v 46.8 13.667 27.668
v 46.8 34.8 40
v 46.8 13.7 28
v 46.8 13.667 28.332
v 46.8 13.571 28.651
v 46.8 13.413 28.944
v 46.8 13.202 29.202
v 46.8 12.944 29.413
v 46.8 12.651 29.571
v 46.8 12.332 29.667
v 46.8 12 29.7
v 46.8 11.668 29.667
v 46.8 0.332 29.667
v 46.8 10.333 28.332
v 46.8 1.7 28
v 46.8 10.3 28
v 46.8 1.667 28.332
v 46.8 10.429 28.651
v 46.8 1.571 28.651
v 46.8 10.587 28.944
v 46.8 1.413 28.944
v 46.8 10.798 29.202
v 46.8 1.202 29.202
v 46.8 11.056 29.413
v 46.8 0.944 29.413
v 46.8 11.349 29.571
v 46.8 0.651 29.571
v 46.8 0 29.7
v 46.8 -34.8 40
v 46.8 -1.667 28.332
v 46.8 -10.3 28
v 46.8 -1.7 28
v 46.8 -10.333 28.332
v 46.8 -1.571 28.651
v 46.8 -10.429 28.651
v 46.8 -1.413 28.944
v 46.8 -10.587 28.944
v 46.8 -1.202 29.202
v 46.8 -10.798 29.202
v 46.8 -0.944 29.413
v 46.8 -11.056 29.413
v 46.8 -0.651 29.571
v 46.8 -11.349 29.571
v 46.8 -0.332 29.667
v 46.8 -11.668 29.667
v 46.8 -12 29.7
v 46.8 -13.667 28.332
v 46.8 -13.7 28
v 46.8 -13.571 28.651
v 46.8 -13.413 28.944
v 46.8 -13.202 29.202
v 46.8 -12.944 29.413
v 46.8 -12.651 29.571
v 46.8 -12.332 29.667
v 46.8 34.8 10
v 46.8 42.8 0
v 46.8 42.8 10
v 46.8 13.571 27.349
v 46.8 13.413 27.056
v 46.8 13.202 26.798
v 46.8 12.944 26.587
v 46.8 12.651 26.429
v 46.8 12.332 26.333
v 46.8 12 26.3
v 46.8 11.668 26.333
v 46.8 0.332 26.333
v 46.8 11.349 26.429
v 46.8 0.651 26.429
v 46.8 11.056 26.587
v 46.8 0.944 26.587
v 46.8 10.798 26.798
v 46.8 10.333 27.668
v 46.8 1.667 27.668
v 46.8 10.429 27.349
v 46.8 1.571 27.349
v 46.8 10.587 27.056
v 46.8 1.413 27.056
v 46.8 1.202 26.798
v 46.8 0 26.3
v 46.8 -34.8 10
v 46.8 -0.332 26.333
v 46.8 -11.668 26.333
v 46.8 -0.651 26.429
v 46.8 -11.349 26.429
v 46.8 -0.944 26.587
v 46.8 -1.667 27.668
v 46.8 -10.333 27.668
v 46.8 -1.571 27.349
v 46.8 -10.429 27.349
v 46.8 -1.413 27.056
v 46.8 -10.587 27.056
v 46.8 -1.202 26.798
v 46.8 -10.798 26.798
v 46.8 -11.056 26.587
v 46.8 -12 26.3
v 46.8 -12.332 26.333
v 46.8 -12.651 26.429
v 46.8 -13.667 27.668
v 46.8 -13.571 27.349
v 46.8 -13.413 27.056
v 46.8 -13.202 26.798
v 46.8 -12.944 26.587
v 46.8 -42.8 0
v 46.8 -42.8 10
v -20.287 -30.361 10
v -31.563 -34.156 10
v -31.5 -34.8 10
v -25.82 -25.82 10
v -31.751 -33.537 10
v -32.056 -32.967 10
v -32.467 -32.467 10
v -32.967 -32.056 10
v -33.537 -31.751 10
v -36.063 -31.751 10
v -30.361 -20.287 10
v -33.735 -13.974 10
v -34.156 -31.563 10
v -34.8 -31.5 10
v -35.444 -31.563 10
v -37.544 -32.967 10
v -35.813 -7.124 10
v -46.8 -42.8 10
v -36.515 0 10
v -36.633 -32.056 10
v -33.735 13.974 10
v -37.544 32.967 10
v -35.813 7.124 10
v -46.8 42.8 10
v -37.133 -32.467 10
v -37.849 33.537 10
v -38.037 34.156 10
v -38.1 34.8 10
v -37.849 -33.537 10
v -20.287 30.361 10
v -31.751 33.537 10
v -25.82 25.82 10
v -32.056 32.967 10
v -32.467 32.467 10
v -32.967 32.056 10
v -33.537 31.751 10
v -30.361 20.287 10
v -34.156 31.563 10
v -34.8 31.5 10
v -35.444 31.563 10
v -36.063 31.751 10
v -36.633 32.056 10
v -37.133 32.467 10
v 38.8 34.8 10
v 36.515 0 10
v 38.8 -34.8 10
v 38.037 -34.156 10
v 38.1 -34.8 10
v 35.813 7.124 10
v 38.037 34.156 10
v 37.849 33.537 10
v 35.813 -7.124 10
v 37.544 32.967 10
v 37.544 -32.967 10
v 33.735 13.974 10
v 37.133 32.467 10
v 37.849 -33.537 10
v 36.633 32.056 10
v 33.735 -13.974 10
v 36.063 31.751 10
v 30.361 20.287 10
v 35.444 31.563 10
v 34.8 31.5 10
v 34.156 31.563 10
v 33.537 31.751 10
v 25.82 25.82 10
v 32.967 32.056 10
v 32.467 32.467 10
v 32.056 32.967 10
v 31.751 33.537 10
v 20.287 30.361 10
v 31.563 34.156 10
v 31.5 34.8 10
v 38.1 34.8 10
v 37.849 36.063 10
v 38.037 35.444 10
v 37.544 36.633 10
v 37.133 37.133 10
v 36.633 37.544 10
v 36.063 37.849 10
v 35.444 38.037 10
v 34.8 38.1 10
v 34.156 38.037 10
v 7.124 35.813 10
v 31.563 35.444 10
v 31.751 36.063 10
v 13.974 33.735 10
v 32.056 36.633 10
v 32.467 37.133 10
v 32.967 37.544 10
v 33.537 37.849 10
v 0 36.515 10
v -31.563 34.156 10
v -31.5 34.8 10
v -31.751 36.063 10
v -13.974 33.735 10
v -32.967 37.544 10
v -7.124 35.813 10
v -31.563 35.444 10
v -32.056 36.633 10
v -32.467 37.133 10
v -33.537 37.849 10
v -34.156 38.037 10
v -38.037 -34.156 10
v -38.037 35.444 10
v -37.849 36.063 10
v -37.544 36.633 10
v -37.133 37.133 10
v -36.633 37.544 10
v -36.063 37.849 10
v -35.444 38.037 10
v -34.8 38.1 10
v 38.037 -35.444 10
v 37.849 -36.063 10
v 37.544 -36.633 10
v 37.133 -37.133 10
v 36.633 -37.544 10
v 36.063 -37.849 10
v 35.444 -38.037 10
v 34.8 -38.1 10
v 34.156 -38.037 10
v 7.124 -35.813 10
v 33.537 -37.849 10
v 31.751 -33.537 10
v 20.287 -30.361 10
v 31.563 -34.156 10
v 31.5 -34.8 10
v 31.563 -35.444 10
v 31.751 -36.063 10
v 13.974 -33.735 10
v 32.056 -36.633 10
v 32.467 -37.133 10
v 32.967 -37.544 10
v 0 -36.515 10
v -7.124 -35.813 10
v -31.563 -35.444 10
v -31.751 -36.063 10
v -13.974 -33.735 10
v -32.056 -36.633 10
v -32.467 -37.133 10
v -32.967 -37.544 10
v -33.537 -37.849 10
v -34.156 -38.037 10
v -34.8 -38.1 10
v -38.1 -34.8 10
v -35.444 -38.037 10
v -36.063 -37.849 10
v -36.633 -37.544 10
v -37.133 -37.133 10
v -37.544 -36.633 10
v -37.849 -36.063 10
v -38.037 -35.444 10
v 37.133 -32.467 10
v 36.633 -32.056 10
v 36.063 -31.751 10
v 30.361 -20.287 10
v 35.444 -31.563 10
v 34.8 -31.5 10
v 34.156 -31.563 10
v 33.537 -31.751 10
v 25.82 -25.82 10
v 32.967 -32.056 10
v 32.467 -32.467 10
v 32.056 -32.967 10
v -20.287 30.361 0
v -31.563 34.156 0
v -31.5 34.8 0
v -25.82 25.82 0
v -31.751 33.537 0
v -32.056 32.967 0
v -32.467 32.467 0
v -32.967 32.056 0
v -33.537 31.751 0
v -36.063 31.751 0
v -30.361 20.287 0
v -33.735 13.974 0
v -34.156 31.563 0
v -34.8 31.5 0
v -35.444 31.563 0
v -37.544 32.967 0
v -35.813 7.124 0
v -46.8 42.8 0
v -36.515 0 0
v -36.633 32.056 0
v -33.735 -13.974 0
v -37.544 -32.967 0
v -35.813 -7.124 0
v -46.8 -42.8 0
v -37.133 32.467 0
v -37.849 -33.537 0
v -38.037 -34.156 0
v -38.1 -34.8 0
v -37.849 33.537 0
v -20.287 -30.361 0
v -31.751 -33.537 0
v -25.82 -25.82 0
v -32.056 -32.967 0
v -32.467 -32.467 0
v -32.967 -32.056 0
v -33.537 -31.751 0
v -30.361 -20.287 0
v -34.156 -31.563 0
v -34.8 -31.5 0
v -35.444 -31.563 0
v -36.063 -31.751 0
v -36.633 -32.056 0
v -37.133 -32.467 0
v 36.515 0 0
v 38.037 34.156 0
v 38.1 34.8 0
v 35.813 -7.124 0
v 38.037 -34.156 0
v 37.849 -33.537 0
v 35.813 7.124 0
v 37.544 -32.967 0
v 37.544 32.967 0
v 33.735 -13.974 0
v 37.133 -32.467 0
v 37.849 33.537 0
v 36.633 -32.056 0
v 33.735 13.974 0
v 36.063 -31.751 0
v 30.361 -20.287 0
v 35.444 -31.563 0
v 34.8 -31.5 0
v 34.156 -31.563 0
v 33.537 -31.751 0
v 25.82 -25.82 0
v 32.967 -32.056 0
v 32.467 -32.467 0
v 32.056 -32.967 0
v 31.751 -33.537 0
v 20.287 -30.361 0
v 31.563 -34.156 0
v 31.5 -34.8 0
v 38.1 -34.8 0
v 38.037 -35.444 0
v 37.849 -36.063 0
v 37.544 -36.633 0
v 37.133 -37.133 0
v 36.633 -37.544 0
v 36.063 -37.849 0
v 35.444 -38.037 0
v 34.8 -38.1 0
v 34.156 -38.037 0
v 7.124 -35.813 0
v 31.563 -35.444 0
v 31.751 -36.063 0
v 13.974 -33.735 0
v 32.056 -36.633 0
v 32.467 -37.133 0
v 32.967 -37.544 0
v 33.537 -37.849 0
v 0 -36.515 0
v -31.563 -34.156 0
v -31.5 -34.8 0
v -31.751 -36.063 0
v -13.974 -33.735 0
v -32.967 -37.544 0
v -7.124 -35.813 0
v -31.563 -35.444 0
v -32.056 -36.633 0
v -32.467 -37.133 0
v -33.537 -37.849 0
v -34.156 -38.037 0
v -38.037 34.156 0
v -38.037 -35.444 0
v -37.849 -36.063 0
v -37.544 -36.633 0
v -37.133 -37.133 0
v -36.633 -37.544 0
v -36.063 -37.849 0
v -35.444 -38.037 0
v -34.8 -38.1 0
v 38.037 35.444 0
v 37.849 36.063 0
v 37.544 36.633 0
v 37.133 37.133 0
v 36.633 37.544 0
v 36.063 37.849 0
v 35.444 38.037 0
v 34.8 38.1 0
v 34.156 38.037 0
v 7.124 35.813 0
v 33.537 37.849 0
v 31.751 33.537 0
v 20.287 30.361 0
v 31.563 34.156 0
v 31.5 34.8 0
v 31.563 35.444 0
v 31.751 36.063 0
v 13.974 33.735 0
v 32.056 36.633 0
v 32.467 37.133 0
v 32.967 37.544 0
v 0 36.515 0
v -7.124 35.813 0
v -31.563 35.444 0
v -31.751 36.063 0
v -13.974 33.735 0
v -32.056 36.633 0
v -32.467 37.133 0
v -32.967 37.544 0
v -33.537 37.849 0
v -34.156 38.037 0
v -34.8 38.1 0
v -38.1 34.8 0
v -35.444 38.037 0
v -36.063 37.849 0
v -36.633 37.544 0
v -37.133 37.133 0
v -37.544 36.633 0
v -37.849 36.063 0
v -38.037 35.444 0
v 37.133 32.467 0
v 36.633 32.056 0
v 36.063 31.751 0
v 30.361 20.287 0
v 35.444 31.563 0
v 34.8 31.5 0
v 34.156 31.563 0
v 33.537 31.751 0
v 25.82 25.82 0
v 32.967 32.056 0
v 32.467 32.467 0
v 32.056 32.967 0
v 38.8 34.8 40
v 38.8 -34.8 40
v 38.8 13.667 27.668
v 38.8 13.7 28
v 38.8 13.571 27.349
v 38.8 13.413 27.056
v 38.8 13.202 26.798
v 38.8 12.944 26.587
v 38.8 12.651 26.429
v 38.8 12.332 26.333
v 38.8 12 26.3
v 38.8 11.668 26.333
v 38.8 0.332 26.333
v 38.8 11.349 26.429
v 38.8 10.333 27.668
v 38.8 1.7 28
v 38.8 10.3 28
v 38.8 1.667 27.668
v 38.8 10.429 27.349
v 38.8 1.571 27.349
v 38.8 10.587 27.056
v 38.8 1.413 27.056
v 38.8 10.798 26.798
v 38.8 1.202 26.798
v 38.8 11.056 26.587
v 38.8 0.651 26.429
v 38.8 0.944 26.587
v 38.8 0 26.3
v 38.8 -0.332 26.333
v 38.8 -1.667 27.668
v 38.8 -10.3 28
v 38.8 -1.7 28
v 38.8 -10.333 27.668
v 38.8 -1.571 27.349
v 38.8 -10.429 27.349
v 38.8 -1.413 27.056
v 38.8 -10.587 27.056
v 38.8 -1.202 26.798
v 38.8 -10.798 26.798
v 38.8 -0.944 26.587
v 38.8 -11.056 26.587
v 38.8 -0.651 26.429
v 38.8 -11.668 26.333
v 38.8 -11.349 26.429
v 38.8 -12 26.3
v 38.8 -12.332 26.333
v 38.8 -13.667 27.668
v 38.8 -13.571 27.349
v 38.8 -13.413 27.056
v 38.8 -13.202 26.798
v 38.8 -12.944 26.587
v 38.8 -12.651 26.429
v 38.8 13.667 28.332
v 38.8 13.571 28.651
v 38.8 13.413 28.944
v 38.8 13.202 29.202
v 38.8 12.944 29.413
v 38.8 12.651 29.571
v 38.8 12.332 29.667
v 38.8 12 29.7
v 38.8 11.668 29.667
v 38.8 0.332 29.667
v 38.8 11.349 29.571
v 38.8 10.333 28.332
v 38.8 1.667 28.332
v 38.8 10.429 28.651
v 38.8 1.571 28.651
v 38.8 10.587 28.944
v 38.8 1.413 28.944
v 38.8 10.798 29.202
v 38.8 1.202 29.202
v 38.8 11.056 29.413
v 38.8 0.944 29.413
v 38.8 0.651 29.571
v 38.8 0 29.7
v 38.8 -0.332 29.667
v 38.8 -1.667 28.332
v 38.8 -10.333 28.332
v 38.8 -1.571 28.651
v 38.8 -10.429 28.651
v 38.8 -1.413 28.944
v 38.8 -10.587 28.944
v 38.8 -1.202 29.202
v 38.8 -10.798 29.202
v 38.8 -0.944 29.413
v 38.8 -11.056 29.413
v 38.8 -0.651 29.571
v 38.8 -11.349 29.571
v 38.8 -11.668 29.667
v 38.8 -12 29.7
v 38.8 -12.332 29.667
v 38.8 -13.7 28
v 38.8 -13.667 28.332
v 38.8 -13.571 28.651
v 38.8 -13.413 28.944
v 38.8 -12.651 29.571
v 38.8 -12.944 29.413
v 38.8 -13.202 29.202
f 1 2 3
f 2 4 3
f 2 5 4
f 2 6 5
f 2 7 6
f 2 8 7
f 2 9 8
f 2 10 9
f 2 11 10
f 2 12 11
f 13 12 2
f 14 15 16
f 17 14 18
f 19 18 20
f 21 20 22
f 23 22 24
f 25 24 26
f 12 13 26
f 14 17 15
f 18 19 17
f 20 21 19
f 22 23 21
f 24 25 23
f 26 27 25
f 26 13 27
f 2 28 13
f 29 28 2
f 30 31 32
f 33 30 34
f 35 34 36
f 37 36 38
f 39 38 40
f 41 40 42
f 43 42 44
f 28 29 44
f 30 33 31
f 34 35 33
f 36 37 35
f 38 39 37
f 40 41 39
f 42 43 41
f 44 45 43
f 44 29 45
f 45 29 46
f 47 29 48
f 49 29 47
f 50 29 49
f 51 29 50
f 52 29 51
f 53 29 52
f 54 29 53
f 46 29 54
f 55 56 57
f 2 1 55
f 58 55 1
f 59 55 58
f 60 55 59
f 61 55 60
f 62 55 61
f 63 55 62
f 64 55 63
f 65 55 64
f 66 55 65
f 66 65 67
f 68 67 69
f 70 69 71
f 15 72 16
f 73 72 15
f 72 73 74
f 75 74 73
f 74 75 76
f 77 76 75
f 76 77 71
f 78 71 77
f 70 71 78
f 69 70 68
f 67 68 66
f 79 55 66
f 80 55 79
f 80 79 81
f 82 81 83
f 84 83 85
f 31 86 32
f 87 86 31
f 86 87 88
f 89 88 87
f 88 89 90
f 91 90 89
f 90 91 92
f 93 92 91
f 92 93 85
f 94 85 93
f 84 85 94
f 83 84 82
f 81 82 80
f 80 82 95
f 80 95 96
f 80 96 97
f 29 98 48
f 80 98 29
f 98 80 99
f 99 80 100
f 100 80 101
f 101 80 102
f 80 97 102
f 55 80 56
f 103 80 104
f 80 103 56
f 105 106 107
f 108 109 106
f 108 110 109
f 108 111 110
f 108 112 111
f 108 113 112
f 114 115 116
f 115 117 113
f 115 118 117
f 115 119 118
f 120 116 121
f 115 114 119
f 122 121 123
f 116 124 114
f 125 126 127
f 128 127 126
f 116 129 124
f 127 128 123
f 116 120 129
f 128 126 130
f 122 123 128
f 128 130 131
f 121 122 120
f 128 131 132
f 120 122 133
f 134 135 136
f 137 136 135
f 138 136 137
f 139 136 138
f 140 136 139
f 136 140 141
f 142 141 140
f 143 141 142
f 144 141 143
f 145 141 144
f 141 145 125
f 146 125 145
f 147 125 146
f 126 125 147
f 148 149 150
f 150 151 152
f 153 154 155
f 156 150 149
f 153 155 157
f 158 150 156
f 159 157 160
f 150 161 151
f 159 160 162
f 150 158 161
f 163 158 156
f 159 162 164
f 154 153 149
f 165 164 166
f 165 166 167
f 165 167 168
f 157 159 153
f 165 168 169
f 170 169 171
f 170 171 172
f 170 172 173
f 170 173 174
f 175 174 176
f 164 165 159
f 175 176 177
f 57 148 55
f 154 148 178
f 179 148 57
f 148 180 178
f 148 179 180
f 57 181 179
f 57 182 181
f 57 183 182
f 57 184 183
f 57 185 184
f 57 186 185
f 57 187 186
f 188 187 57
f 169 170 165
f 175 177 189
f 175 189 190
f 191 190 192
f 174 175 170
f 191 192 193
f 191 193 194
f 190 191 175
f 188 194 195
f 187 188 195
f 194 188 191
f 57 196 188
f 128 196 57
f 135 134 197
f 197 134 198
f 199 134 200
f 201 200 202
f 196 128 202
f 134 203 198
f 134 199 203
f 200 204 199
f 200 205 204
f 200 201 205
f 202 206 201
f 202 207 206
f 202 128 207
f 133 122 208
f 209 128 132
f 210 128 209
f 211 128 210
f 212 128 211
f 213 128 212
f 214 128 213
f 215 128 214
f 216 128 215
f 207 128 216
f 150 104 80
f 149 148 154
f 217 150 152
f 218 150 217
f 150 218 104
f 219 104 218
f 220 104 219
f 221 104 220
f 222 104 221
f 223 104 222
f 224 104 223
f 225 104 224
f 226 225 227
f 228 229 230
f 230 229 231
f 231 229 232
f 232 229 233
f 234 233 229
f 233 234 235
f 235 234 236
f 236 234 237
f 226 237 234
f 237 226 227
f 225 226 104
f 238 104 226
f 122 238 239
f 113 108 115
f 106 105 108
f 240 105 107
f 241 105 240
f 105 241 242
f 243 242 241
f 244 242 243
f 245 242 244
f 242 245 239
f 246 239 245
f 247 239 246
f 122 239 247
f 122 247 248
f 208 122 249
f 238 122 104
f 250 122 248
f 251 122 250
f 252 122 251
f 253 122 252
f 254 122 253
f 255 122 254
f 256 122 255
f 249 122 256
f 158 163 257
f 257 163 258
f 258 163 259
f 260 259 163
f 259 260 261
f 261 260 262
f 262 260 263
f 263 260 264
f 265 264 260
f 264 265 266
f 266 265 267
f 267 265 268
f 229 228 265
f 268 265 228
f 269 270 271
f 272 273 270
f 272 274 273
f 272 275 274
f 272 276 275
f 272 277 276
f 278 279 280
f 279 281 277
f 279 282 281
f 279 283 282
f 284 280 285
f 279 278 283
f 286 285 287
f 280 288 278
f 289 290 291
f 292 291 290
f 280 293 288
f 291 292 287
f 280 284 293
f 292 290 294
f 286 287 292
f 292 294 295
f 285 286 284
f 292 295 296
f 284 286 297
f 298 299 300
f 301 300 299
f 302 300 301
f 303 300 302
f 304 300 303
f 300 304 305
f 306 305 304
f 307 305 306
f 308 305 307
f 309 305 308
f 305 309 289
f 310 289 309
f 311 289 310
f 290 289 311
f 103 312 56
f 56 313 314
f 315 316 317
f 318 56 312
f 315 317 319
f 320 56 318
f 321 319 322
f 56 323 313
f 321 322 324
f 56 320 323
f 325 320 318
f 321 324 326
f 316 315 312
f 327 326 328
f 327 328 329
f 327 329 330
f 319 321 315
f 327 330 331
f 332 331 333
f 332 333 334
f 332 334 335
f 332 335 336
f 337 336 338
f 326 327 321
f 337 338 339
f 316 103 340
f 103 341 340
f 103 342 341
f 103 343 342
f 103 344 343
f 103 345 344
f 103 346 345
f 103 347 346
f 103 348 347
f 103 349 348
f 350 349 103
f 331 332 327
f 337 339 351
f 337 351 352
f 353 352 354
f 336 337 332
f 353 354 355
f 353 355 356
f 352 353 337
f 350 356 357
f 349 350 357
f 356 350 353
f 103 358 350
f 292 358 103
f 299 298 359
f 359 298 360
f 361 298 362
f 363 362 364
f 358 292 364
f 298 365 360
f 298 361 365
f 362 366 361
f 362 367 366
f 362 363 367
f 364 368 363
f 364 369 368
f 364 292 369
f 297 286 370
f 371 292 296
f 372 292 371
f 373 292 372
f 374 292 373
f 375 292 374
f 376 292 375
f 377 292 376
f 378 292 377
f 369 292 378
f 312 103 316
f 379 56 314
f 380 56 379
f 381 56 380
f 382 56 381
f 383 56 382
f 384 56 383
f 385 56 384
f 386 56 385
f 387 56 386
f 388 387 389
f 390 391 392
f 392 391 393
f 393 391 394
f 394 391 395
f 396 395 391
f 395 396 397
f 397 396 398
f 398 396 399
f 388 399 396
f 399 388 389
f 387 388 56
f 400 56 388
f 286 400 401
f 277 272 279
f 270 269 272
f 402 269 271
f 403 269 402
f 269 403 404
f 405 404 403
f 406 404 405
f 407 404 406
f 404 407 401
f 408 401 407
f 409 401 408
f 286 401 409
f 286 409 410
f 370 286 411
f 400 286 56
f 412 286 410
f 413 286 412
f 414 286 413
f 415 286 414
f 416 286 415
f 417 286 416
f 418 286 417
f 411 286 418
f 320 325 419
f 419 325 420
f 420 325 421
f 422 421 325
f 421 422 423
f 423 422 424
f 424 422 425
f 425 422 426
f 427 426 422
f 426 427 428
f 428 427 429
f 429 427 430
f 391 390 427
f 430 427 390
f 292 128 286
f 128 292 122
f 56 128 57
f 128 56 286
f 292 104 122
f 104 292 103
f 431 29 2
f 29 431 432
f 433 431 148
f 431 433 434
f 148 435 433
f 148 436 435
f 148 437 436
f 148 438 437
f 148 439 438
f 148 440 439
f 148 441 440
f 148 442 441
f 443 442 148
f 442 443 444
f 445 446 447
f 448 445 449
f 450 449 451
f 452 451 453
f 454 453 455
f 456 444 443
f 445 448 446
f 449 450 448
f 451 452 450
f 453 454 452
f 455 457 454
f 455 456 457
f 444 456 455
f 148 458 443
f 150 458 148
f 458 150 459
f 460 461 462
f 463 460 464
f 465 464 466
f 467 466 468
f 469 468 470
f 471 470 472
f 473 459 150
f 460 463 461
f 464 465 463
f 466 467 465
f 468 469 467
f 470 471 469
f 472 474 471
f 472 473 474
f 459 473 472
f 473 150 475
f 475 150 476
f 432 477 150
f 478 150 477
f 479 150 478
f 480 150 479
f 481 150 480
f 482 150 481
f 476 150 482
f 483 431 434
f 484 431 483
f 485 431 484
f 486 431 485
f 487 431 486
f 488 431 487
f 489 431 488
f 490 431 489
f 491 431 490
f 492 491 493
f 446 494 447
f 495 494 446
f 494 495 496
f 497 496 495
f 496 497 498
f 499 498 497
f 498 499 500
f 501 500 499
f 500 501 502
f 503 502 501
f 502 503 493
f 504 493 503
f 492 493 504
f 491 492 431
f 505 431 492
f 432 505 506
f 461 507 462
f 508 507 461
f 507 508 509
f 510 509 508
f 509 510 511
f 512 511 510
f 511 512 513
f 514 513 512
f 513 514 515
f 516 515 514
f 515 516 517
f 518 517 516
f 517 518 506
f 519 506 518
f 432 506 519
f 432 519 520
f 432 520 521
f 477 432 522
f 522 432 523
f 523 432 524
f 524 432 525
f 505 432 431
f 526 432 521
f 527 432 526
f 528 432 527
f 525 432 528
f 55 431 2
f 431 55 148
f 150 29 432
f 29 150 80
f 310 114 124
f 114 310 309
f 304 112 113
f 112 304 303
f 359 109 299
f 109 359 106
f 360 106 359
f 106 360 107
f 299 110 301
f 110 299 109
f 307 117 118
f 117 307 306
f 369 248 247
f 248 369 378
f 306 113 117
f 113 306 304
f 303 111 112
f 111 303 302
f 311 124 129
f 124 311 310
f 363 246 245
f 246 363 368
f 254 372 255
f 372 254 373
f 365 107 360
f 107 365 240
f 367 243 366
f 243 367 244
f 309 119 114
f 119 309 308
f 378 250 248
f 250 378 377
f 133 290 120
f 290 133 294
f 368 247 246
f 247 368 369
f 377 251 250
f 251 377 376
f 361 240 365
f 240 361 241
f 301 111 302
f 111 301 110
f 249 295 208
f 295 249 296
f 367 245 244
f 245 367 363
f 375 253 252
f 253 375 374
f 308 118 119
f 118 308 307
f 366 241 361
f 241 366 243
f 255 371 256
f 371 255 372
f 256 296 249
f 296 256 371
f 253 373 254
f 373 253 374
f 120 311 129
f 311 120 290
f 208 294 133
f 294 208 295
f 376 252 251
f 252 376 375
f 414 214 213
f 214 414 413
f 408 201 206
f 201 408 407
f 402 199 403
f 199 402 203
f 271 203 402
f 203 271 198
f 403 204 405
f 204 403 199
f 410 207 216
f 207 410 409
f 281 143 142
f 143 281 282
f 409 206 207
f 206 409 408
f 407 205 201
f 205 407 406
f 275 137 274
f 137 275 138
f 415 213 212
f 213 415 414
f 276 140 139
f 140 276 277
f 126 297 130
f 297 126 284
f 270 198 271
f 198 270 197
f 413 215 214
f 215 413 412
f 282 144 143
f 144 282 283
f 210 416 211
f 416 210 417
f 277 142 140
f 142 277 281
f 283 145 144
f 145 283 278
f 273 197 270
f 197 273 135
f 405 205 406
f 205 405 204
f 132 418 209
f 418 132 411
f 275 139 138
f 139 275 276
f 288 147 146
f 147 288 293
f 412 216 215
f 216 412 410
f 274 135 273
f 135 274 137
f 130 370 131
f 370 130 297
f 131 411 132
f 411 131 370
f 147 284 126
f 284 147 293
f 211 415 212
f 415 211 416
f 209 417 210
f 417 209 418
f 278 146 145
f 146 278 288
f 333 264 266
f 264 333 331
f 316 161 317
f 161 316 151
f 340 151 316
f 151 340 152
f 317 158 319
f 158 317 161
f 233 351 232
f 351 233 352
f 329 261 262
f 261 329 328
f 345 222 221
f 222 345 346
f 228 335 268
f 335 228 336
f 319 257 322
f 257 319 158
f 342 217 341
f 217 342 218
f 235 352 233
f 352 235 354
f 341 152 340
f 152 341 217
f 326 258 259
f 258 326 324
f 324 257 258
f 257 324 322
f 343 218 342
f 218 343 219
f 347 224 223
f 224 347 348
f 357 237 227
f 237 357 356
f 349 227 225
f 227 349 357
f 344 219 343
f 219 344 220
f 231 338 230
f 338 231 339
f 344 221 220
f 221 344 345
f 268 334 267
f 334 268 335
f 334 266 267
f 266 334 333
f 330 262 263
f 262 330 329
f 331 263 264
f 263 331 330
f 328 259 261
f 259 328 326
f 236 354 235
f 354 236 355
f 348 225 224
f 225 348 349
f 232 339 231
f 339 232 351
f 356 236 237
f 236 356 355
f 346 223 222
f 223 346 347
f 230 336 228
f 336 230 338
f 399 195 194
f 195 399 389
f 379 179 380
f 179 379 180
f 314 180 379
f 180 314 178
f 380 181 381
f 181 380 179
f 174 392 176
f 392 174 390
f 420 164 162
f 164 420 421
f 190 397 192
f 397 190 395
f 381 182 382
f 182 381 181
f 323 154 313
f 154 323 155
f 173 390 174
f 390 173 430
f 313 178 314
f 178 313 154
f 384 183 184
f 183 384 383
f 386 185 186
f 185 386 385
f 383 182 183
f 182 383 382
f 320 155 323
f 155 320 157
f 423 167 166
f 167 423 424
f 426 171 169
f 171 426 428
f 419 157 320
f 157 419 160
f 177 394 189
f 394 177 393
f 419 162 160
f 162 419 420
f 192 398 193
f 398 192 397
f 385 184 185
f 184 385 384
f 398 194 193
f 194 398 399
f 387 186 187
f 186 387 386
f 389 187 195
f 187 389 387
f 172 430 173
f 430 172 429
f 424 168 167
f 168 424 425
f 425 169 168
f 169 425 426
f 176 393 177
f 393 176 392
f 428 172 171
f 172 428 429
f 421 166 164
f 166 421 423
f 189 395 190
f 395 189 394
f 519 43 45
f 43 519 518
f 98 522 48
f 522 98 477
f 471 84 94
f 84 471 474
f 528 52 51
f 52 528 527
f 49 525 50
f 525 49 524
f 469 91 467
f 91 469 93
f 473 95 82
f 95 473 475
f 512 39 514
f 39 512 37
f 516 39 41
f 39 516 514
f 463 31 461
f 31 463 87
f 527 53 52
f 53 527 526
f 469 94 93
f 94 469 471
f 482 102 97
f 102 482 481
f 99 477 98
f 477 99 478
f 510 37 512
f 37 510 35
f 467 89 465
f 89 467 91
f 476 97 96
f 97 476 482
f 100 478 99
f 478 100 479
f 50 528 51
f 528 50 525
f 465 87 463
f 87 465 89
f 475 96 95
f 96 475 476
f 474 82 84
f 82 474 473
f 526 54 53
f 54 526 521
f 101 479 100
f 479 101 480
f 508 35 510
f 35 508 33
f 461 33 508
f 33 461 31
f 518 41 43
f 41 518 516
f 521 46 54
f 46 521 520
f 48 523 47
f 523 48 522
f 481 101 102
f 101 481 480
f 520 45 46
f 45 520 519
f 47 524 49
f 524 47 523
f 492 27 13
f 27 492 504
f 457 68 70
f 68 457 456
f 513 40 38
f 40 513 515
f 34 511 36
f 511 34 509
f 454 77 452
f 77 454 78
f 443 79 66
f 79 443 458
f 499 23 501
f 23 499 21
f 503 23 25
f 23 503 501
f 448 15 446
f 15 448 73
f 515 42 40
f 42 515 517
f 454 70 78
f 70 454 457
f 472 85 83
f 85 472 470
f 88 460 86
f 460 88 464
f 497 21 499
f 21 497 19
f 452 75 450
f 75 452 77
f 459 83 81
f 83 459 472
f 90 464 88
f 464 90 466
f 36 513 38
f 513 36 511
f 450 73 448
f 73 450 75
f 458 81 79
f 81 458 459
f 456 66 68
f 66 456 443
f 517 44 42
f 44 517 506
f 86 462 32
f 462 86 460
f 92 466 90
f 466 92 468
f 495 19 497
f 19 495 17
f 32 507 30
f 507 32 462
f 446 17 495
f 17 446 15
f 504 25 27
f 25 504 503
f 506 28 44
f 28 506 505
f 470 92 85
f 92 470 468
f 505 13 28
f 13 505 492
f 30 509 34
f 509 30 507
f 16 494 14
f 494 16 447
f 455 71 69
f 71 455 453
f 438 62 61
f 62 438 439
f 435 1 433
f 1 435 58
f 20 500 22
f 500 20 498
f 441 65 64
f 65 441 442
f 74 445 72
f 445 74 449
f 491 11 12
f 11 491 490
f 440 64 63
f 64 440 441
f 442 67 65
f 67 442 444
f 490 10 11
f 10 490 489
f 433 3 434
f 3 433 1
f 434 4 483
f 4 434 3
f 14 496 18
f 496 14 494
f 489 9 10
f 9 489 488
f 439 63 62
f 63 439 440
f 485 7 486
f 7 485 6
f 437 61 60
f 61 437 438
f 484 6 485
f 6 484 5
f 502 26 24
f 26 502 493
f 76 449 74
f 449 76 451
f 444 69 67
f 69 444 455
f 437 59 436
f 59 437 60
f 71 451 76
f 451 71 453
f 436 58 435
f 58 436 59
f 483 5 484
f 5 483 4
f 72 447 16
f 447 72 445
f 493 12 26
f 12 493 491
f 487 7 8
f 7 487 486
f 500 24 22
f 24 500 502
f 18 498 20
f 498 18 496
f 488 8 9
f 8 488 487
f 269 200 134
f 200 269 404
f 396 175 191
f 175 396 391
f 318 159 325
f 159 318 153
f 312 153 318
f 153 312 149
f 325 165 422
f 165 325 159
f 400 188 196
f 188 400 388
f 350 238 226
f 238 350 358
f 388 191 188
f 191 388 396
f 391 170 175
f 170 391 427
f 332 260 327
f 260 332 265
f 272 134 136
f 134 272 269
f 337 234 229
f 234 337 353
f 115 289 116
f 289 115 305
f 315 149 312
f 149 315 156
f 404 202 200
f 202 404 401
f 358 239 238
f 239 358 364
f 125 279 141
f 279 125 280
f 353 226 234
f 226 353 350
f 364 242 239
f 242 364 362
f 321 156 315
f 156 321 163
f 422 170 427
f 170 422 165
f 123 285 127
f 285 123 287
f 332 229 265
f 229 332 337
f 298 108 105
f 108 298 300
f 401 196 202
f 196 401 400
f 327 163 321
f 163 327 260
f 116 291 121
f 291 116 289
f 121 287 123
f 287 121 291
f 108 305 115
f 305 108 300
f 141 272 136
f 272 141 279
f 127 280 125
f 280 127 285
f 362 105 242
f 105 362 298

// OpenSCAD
$fn = 32;

// ----------------------------------------------------------------------
// Motor mount plate: NEMA34, 93.6 x 85.6 x 50 mm
// ----------------------------------------------------------------------

// --- parameters (mm) ---
plate_w = 93.6;           // plate length, X
plate_d = 85.6;           // plate width, Y
plate_t = 10;             // plate thickness
pattern = 69.6;           // NEMA34 bolt spacing
motor_d = 6.6;            // NEMA34 screw clearance
pilot_d = 73.03;          // pilot boss bore
second_d = 3.4;           // second fastener hole
wall_h = 40;              // upright height
wall_t = 8;               // upright thickness

module plate() {
  translate([-plate_w / 2, -plate_d / 2, 0]) cube([plate_w, plate_d, plate_t]);
}

module motor_holes() {
  for (sx = [-1, 1]) for (sy = [-1, 1])
    translate([sx * pattern / 2, sy * pattern / 2, -1])
      cylinder(h = plate_t + 2, d = motor_d);
}
module upright() {
  /* wall sunk 1 mm into the plate for a positive overlap */
  translate([plate_w / 2 - wall_t, -plate_d / 2 + wall_t, plate_t - 1])
    cube([wall_t, plate_d - 2 * wall_t, wall_h - plate_t + 1]);
}

difference() {
  union() {
    plate();
    upright();
  }
  motor_holes();
  translate([0, 0, -1]) cylinder(h = plate_t + 2, d = pilot_d);
  for (i = [0 : 2])
    translate([plate_w / 2 - wall_t - 1, (i - 1) * wall_h * 0.3, plate_t + wall_h * 0.45]) rotate([0, 90, 0]) cylinder(h = wall_t + 2, d = second_d);
}
